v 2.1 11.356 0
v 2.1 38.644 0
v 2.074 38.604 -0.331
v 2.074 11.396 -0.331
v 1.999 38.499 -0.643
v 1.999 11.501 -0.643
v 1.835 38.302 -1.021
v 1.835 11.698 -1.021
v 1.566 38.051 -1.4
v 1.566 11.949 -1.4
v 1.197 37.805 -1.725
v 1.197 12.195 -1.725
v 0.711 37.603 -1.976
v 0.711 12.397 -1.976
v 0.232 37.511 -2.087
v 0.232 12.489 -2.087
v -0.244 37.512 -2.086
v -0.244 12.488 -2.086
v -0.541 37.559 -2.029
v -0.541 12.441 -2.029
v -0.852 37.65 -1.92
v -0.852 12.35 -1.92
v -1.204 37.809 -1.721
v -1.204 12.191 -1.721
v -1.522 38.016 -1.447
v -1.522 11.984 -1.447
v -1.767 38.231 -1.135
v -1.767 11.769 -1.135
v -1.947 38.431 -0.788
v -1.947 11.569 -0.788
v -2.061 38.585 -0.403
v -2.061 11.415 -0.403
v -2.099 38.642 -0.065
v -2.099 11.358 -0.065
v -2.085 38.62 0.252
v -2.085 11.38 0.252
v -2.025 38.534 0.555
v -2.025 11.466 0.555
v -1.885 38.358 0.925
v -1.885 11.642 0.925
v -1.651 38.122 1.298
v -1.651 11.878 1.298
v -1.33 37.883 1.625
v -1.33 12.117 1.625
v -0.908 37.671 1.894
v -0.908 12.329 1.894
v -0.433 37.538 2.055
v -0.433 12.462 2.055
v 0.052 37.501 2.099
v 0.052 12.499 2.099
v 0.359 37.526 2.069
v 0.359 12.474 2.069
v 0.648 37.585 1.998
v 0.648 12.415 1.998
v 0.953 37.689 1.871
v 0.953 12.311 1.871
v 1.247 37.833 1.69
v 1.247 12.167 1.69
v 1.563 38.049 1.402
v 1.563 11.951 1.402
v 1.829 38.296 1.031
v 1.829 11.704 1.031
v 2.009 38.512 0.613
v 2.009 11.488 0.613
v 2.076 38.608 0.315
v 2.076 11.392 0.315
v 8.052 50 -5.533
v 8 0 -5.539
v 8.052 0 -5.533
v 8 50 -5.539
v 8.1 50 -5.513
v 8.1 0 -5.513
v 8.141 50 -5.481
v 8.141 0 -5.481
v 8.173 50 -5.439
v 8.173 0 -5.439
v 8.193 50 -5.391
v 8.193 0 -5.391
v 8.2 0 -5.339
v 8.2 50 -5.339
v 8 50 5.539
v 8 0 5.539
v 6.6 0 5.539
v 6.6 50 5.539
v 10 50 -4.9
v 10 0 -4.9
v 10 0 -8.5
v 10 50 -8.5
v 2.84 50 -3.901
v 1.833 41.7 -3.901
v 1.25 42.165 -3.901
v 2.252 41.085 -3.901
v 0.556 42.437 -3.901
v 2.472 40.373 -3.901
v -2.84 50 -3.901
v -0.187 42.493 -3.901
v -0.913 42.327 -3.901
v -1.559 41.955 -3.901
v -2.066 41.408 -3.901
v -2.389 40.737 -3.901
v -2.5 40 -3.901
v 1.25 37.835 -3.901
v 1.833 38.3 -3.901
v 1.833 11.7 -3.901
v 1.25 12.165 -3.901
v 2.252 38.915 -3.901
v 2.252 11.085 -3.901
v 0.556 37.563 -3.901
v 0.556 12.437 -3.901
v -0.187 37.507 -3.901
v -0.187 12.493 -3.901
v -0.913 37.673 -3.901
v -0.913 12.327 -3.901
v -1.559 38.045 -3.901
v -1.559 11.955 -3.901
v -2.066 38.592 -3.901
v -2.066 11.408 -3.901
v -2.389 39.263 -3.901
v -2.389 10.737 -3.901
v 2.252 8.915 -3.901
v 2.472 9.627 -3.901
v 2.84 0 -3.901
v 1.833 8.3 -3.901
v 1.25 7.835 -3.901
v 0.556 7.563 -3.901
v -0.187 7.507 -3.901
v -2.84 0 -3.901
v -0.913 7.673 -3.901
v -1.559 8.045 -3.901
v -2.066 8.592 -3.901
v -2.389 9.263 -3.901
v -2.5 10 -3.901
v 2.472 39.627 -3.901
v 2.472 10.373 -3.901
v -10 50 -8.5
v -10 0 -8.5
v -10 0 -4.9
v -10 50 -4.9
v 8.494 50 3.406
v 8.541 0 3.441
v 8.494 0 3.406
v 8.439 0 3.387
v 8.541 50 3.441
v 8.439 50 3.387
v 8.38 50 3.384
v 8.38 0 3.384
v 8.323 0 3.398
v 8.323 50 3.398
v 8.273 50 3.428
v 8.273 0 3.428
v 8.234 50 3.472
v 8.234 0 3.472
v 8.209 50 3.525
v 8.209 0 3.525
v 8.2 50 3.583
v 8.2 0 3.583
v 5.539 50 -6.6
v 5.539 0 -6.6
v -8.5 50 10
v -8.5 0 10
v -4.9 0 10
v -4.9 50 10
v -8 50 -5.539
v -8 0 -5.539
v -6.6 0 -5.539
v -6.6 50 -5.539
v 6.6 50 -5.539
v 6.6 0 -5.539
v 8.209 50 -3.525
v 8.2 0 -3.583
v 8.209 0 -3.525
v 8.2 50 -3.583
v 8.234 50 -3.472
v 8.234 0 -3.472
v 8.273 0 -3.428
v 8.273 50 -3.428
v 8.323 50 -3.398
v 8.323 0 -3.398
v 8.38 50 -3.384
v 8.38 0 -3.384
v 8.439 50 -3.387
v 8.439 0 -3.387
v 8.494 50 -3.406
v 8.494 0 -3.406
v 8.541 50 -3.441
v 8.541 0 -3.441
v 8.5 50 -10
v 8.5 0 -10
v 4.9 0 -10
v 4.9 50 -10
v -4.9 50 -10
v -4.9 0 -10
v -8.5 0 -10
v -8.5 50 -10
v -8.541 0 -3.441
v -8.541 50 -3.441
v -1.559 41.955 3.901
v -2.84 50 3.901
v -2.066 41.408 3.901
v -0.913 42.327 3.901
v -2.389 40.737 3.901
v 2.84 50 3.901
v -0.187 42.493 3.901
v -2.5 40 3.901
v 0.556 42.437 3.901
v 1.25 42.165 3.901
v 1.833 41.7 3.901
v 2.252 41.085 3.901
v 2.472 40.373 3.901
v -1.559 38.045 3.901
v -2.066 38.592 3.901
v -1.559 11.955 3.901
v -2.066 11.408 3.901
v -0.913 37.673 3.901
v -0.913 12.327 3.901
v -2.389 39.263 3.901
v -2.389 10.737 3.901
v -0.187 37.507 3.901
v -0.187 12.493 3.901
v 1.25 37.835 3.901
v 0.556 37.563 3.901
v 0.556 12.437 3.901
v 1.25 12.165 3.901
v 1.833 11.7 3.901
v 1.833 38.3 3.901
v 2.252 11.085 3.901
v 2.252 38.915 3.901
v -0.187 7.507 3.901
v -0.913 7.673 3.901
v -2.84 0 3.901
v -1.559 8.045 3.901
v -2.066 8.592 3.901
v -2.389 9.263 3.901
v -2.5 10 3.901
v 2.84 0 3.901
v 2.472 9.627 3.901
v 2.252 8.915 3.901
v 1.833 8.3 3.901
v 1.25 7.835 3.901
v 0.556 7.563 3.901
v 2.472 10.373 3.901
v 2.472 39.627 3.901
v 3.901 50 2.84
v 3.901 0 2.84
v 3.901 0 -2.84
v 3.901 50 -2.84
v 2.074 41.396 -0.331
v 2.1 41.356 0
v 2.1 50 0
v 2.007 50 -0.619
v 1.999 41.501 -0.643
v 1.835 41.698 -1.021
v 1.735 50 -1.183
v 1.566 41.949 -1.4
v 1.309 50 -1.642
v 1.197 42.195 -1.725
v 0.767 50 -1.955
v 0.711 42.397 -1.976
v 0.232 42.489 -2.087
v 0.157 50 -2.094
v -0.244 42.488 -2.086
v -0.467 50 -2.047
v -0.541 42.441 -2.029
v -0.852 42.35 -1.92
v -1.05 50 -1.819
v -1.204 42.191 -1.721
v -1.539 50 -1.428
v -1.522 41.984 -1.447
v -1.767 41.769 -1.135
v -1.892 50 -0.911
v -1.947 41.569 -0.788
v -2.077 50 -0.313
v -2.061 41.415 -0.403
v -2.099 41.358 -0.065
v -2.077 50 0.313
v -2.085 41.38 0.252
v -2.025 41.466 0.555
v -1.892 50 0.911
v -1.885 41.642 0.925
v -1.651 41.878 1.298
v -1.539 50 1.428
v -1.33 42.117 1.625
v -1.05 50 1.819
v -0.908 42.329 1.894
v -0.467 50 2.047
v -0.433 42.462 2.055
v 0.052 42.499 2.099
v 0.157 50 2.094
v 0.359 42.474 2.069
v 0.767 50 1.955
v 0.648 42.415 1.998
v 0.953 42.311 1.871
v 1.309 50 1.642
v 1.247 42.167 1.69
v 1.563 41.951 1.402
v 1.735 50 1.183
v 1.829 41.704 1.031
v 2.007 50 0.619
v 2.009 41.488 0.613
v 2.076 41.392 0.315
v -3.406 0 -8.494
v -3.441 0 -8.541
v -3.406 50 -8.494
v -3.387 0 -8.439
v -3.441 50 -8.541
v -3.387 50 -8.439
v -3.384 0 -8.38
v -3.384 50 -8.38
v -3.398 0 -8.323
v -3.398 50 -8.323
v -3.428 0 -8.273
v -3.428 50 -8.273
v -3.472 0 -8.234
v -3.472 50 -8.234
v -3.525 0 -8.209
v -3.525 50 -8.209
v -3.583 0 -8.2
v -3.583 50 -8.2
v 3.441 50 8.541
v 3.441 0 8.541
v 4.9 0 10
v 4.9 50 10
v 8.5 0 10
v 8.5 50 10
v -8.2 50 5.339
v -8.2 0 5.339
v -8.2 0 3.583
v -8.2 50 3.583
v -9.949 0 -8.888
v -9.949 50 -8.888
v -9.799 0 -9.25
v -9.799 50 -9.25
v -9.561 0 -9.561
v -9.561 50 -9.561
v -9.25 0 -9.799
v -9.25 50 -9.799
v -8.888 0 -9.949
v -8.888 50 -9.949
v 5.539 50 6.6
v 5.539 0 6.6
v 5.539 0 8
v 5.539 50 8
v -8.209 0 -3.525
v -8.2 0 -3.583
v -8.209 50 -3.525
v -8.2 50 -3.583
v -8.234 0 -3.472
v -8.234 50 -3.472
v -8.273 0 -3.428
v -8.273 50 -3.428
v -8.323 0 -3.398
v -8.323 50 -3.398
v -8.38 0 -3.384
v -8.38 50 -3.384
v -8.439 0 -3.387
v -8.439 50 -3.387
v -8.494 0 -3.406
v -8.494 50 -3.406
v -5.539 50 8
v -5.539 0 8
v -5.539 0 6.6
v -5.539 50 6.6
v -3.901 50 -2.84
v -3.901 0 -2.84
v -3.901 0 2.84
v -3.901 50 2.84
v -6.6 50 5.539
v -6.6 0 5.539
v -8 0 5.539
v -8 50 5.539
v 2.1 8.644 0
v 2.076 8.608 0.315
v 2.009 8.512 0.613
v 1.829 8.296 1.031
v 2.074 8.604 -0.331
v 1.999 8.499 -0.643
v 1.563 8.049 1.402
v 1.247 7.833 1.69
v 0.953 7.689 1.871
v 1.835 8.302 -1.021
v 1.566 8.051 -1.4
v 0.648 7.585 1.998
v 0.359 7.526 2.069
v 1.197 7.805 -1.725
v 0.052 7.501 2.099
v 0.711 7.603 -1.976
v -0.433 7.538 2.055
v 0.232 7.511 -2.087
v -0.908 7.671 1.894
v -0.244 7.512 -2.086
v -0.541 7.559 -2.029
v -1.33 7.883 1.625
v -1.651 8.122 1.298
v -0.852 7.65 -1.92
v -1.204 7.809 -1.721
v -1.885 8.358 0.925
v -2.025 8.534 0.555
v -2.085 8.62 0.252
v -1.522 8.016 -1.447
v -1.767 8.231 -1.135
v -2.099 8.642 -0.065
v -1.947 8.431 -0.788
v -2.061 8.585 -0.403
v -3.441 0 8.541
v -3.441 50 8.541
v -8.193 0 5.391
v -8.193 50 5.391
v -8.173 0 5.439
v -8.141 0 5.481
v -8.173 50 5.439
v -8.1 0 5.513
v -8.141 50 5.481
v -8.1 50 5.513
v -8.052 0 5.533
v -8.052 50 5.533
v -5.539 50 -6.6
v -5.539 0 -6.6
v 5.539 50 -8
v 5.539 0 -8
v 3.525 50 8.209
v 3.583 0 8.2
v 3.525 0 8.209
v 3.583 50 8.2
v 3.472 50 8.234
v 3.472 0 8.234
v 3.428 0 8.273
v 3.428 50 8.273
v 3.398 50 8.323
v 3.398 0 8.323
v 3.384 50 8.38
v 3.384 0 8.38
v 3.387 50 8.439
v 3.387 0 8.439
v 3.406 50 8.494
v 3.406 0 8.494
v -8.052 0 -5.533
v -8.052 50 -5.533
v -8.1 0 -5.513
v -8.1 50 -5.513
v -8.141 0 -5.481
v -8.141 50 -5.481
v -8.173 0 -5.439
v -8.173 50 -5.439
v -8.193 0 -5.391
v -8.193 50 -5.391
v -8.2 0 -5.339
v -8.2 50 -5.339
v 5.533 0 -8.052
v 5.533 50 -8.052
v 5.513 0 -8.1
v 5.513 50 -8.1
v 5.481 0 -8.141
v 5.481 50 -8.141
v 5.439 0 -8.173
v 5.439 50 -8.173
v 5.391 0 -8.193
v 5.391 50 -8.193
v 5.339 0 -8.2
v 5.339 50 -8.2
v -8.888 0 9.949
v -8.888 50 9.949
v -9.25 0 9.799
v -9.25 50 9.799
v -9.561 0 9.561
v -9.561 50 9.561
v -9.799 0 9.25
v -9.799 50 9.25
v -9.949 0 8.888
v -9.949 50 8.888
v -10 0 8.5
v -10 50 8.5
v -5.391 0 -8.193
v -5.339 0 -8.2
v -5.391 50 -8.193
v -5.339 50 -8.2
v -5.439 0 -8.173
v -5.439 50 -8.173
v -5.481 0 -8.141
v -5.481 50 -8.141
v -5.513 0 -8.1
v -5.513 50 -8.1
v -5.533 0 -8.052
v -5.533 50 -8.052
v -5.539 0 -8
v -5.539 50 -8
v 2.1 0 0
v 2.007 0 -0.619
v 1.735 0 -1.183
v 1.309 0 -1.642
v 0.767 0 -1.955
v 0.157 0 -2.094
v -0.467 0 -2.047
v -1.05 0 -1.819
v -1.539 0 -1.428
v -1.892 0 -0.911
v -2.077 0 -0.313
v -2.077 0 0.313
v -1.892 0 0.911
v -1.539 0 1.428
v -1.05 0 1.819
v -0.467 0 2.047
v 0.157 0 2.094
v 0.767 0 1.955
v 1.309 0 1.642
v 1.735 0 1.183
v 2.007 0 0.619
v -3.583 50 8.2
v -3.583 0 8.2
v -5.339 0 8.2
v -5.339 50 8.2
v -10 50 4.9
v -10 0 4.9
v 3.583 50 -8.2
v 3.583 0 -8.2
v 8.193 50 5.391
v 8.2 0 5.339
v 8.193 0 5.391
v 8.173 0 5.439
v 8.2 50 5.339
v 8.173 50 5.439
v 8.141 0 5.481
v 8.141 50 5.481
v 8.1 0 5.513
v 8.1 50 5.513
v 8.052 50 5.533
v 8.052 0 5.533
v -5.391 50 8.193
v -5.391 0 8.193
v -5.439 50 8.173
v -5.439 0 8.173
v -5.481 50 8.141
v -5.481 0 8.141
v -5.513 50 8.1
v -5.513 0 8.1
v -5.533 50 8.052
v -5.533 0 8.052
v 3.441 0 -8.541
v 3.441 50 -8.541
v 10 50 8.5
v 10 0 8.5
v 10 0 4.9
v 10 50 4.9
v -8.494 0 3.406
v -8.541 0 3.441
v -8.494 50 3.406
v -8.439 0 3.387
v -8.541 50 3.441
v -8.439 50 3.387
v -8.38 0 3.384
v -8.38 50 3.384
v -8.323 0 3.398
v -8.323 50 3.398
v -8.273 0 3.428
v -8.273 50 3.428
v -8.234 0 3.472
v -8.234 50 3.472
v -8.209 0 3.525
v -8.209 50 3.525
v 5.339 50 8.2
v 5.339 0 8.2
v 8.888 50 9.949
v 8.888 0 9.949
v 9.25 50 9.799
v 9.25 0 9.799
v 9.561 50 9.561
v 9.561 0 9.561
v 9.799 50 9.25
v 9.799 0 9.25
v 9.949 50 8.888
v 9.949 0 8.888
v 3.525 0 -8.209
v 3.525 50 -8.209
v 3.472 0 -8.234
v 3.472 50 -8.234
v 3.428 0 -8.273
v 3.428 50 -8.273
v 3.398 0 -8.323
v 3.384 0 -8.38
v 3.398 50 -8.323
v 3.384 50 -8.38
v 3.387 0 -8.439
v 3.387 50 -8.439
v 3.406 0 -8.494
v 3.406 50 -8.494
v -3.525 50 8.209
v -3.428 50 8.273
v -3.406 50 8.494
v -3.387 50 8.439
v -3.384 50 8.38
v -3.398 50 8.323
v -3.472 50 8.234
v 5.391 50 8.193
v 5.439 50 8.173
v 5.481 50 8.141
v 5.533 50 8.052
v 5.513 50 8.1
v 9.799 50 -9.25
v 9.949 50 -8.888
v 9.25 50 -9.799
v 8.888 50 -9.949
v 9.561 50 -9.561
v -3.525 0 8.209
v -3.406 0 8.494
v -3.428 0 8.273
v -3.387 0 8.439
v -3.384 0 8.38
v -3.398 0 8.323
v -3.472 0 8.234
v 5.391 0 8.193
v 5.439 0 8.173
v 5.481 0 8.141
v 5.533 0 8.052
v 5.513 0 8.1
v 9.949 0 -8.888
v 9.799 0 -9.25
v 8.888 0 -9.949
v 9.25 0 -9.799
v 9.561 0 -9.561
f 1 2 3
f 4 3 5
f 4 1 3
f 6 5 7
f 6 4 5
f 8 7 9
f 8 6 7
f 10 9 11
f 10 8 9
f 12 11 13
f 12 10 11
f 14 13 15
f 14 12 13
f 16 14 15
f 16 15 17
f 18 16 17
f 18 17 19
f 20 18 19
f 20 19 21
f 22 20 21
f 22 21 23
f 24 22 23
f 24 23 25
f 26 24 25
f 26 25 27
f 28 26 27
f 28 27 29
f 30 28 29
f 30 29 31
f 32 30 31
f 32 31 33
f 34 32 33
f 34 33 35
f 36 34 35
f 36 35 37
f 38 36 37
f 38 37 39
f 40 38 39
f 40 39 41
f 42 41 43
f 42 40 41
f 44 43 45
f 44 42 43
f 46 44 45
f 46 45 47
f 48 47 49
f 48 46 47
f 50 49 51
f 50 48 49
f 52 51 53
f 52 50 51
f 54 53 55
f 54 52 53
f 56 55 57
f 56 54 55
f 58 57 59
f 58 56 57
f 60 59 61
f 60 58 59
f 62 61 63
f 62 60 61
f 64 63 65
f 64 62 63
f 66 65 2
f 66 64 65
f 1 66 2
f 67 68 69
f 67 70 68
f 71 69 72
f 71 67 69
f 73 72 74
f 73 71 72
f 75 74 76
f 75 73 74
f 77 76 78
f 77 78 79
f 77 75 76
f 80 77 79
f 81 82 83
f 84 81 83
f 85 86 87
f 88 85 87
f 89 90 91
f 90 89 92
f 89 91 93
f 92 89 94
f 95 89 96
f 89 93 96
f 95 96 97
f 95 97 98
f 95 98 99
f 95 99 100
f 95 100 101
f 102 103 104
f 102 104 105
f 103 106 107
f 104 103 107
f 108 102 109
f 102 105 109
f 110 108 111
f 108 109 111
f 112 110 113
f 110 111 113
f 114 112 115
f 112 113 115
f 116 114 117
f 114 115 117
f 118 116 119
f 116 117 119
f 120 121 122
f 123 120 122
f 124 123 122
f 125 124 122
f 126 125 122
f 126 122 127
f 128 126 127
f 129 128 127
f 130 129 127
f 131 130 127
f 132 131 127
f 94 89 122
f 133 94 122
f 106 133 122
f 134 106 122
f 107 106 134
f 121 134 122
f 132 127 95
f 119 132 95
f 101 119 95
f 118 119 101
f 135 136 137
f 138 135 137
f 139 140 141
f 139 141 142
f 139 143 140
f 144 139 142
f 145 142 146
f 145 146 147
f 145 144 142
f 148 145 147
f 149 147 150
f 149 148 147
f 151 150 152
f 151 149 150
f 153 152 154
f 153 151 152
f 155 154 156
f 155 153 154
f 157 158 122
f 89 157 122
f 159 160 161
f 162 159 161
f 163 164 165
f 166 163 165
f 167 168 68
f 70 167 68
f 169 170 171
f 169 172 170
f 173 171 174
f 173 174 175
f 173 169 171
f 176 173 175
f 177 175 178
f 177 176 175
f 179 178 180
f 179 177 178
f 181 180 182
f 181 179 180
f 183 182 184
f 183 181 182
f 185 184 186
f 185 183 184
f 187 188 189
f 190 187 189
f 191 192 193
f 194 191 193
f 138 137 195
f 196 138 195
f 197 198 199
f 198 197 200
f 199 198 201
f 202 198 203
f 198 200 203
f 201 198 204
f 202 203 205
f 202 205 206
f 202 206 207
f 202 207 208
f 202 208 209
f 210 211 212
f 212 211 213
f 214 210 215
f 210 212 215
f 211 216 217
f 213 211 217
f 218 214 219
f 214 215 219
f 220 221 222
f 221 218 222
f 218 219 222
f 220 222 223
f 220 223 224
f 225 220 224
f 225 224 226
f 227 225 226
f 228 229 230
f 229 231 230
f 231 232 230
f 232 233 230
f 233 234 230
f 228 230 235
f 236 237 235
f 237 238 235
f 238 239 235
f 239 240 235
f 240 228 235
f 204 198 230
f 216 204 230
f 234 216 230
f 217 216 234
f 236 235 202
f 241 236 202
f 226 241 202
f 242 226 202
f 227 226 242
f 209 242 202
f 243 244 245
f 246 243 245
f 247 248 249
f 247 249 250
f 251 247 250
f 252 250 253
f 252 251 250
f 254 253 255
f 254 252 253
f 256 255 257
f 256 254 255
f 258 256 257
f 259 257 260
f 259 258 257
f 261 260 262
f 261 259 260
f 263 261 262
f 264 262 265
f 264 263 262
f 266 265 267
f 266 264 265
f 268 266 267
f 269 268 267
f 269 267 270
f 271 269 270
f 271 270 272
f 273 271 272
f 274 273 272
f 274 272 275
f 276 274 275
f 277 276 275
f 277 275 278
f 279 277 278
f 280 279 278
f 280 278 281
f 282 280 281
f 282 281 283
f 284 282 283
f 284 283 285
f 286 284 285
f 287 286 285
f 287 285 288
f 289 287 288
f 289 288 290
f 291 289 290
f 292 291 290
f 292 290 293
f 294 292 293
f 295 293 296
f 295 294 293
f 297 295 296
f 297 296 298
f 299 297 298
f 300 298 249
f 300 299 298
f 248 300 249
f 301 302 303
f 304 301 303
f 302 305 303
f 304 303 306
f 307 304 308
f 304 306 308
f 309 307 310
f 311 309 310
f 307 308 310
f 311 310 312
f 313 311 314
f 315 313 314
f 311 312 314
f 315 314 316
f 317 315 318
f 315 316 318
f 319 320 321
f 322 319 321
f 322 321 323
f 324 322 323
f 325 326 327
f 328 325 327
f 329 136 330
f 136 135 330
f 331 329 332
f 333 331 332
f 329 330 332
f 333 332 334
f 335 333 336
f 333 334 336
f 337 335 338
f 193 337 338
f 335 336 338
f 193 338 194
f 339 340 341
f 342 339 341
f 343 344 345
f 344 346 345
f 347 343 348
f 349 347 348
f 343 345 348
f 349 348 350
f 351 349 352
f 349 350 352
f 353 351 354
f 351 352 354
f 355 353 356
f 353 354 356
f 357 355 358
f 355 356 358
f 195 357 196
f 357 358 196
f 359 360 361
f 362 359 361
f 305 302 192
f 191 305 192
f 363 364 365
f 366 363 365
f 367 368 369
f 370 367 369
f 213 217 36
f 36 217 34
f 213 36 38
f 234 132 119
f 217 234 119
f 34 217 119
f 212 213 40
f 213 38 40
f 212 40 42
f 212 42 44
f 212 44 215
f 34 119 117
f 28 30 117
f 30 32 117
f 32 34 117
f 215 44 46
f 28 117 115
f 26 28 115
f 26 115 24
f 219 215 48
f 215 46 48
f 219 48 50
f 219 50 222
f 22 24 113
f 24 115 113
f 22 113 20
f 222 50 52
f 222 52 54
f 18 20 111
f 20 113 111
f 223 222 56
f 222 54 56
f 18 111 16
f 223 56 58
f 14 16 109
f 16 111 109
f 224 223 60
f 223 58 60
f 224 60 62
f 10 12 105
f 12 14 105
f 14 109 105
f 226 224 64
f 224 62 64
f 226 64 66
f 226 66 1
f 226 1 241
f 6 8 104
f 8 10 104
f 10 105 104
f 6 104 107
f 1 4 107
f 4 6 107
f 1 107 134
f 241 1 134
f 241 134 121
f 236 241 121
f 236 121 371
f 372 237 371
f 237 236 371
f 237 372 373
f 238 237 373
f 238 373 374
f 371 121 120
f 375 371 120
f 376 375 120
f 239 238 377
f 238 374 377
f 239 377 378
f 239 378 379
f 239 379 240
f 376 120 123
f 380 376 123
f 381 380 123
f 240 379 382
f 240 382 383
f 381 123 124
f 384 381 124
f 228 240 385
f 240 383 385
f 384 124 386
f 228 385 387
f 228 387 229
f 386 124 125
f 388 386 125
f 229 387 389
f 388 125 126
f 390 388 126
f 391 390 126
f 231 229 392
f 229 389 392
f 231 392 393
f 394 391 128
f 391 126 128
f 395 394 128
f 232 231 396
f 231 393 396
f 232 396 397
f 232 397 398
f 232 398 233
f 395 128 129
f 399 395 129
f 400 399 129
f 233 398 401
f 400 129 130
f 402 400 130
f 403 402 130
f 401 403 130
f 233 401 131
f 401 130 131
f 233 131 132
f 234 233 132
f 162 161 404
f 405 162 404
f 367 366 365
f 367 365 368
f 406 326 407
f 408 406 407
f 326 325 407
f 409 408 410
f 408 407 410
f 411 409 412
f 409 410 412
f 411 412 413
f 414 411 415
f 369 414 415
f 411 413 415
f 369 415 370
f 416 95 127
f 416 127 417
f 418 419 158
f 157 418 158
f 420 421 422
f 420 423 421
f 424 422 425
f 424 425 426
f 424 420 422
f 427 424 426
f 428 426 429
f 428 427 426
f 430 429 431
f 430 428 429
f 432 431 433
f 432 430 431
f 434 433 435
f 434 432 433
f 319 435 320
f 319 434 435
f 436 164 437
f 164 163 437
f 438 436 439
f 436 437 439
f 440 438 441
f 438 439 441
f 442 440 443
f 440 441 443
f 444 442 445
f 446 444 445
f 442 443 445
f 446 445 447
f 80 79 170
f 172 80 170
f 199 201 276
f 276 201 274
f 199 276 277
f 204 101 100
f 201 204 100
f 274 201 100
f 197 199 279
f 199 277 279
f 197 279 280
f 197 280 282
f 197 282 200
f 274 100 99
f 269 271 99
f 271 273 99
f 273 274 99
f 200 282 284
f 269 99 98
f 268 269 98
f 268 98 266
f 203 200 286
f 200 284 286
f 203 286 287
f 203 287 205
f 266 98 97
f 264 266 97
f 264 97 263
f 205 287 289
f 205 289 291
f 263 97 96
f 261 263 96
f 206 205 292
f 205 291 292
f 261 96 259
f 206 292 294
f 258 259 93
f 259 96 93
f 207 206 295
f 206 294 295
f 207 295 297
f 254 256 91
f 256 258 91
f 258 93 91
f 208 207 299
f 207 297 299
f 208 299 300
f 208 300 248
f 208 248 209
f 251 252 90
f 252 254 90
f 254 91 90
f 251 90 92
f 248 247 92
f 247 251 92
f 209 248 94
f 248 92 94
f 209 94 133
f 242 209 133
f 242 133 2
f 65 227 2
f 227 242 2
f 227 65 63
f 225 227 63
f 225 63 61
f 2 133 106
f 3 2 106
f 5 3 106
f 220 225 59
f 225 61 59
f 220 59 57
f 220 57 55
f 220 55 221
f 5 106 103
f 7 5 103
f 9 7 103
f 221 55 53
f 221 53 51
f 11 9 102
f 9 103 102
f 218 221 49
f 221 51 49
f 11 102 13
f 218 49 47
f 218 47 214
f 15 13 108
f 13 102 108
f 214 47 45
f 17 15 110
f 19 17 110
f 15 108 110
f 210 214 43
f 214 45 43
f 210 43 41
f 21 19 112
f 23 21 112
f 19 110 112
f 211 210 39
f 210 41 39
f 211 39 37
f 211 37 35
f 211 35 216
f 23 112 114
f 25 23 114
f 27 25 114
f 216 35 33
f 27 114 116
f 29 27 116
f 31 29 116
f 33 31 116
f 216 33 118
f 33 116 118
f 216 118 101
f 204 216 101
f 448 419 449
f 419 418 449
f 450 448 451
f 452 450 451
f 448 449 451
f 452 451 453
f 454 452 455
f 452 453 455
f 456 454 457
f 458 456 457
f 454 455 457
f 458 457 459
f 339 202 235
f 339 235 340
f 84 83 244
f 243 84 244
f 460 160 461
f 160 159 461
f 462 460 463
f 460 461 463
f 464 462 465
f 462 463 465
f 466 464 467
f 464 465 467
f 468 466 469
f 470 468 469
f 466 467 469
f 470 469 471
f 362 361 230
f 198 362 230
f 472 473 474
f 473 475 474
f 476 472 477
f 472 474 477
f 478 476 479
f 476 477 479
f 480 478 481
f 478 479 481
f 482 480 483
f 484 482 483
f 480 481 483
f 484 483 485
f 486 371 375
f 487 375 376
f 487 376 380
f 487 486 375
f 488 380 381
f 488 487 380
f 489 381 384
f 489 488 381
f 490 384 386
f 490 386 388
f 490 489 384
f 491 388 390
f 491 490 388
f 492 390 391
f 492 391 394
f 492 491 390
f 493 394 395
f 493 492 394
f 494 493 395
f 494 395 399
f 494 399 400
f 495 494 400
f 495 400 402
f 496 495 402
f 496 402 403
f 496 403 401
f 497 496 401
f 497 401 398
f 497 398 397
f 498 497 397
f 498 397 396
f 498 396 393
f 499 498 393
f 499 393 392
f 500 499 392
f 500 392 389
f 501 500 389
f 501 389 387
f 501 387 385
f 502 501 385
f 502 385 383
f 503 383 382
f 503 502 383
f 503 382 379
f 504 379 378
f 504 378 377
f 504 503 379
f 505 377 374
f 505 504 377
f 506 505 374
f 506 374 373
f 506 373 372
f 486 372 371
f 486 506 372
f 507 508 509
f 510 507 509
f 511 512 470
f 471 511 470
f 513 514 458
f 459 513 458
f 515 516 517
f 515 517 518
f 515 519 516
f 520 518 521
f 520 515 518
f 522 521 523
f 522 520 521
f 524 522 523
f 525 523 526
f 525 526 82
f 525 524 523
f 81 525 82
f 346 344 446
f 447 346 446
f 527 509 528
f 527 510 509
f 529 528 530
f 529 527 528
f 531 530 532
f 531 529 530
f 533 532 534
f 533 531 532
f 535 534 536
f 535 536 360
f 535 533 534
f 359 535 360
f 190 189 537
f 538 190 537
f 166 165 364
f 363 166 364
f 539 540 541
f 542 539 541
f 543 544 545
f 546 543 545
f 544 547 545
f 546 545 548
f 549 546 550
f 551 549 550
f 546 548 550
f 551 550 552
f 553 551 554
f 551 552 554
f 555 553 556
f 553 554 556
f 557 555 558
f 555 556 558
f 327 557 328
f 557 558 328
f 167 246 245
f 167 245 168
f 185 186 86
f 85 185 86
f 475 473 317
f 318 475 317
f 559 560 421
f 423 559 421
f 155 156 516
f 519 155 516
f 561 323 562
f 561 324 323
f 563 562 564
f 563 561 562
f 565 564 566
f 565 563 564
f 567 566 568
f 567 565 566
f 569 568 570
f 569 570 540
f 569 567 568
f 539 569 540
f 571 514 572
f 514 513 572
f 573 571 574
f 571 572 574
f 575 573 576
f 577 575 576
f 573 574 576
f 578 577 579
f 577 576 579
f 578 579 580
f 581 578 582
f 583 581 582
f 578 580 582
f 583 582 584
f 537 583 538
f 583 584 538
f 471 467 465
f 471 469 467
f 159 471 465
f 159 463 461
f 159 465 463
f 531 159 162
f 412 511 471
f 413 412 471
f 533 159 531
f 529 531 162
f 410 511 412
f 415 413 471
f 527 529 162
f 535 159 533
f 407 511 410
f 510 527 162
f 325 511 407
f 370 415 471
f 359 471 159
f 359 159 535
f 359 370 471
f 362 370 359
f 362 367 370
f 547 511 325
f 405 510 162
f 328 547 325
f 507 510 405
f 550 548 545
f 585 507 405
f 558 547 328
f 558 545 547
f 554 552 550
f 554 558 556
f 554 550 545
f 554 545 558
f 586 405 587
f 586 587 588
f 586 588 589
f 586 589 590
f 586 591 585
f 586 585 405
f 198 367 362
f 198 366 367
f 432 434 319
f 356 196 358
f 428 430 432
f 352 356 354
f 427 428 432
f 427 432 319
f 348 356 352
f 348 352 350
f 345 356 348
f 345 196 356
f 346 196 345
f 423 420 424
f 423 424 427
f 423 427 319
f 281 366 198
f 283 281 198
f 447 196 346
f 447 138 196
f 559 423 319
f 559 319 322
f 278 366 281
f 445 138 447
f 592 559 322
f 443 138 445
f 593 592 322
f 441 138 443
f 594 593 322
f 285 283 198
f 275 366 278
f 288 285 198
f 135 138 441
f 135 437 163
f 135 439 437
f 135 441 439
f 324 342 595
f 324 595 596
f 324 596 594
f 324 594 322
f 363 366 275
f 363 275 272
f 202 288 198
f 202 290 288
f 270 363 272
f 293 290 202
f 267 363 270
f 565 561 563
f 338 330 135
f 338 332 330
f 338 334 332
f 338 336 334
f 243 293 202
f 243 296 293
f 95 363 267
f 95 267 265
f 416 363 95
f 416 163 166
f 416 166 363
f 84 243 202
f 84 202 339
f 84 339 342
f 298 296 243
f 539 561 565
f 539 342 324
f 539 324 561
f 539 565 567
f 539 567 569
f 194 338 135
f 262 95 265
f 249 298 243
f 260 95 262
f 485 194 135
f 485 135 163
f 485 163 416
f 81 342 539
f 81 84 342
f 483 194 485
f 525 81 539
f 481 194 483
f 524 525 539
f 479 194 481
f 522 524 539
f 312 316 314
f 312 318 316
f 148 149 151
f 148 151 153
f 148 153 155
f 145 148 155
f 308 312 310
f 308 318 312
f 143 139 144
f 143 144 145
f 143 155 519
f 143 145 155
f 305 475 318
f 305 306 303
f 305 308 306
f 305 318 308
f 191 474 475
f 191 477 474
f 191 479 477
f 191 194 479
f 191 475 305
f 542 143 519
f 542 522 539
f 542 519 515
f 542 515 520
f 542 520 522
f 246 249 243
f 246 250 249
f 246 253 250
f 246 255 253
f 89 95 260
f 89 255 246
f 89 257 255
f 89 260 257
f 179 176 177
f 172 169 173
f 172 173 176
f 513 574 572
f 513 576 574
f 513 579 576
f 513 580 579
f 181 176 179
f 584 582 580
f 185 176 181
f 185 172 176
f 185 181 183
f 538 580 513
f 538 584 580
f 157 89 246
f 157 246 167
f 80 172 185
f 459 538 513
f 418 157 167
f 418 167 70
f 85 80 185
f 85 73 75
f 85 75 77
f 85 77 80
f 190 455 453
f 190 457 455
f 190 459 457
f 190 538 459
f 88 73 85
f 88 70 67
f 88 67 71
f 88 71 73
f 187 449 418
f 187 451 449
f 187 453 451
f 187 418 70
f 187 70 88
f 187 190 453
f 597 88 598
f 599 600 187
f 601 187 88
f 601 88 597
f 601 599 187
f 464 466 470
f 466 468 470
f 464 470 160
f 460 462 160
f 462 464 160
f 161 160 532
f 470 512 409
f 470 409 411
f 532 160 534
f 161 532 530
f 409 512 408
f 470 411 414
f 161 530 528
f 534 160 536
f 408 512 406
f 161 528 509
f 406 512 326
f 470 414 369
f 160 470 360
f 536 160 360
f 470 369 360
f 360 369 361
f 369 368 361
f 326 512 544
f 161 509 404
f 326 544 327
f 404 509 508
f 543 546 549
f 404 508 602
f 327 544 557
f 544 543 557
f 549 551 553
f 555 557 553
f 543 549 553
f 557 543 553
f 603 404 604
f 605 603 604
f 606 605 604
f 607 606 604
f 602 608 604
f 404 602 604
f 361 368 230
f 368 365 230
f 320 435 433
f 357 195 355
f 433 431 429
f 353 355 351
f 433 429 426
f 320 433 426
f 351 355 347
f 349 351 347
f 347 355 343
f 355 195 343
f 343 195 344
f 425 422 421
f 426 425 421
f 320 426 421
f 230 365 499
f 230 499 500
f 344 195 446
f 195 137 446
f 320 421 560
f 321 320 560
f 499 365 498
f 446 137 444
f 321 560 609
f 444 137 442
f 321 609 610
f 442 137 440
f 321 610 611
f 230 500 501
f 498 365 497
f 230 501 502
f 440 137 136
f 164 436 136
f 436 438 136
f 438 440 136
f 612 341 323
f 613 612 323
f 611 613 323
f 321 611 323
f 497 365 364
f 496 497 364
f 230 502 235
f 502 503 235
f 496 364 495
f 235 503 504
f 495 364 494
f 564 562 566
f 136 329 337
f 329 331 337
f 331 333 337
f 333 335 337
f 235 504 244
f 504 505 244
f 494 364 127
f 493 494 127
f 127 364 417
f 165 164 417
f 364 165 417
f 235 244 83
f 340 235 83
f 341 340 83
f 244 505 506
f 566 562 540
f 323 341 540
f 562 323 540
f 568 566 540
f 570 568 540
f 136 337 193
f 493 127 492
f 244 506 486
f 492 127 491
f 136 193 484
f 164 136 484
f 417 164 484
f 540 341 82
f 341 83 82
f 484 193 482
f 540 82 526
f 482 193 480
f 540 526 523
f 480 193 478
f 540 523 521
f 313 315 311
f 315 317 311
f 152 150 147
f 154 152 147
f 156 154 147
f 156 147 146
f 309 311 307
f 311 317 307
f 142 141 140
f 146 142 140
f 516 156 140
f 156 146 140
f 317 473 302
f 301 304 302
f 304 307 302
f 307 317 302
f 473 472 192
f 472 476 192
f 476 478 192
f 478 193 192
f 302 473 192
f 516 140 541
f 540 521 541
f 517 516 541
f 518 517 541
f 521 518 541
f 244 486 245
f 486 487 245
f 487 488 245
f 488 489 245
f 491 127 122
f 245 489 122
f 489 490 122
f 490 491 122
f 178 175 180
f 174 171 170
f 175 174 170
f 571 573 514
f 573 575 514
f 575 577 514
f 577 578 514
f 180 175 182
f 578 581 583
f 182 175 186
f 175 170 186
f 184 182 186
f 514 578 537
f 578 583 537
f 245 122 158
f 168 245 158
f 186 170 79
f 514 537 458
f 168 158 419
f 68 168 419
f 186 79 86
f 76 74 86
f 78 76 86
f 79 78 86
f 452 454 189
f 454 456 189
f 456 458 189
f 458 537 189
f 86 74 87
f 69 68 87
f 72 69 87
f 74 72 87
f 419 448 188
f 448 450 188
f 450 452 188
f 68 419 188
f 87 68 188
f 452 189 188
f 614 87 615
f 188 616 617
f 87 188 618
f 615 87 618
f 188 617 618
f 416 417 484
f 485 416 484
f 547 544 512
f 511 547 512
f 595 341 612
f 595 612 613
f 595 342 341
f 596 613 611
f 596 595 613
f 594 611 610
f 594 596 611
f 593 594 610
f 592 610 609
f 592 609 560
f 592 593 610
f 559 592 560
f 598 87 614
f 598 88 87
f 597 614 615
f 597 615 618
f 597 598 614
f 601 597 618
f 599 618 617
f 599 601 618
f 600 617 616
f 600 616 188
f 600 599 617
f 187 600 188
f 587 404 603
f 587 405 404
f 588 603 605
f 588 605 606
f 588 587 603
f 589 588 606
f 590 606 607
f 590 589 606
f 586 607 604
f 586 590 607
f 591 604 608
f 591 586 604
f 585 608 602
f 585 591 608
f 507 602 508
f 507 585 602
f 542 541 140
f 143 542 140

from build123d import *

# Parameters (mm, degrees)
SALIENTE_EXTRUIR1_OUTLINE_R = 2.1
SALIENTE_EXTRUIR1_DEPTH     = 50
REDONDEO1_R                 = 1.5
REDONDEO2_R                 = 0.2
CROQUIS2_R                  = 2.5
CORTAR_EXTRUIR1_DEPTH       = 55.772255751


# Read off the part's stored shape, not the designer's step: Saliente-Extruir1
with BuildPart() as part:
    # Saliente-Extruir1 outline → Saliente-Extruir1 (new body)
    with BuildSketch(Plane(origin=(0, 0, 0), x_dir=(1, 0, 0), z_dir=(0, 1, 0))):
        Polygon((-5.539339828, -6.6), (-2.84, -3.900660172), (2.84, -3.900660172), (5.539339828, -6.6), (5.539339828, -8.2), (3.1, -8.2), (4.9, -10), (10, -10), (10, -4.9), (8.2, -3.1), (8.2, -5.539339828), (6.6, -5.539339828), (3.900660172, -2.84), (3.900660172, 2.84), (6.6, 5.539339828), (8.2, 5.539339828), (8.2, 3.1), (10, 4.9), (10, 10), (4.9, 10), (3.1, 8.2), (5.539339828, 8.2), (5.539339828, 6.6), (2.84, 3.900660172), (-2.84, 3.900660172), (-5.539339828, 6.6), (-5.539339828, 8.2), (-3.1, 8.2), (-4.9, 10), (-10, 10), (-10, 4.9), (-8.2, 3.1), (-8.2, 5.539339828), (-6.6, 5.539339828), (-3.900660172, 2.84), (-3.900660172, -2.84), (-6.6, -5.539339828), (-8.2, -5.539339828), (-8.2, -3.1), (-10, -4.9), (-10, -10), (-4.9, -10), (-3.1, -8.2), (-5.539339828, -8.2), align=None)
        Circle(SALIENTE_EXTRUIR1_OUTLINE_R, mode=Mode.SUBTRACT)
    extrude(amount=SALIENTE_EXTRUIR1_DEPTH)

    # Redondeo1
    redondeo1_edges = [part.edges().sort_by_distance(p)[0] for p in [
        (-10, 25, 10),
        (-10, 25, -10),
        (10, 25, -10),
        (10, 25, 10),
    ]]
    fillet(redondeo1_edges, radius=REDONDEO1_R)

    # Redondeo2
    redondeo2_edges = [part.edges().sort_by_distance(p)[0] for p in [
        (-5.539339828, 25, 8.2),
        (-3.1, 25, 8.2),
        (-8.2, 25, 3.1),
        (-8.2, 25, 5.539339828),
        (-8.2, 25, -5.539339828),
        (-8.2, 25, -3.1),
        (-3.1, 25, -8.2),
        (-5.539339828, 25, -8.2),
        (5.539339828, 25, -8.2),
        (3.1, 25, -8.2),
        (8.2, 25, -3.1),
        (8.2, 25, -5.539339828),
        (8.2, 25, 5.539339828),
        (8.2, 25, 3.1),
        (3.1, 25, 8.2),
        (5.539339828, 25, 8.2),
    ]]
    fillet(redondeo2_edges, radius=REDONDEO2_R)

    # Croquis2 → Cortar-Extruir1 (cut, through all)
    with BuildSketch(Plane(origin=(0, 0, -10), x_dir=(-1, 0, 0), z_dir=(0, 0, -1))):
        with Locations((0, 40)):
            Circle(CROQUIS2_R)
        with Locations((0, 10)):
            Circle(CROQUIS2_R)
    extrude(amount=-CORTAR_EXTRUIR1_DEPTH, mode=Mode.SUBTRACT)


solid = part.part
